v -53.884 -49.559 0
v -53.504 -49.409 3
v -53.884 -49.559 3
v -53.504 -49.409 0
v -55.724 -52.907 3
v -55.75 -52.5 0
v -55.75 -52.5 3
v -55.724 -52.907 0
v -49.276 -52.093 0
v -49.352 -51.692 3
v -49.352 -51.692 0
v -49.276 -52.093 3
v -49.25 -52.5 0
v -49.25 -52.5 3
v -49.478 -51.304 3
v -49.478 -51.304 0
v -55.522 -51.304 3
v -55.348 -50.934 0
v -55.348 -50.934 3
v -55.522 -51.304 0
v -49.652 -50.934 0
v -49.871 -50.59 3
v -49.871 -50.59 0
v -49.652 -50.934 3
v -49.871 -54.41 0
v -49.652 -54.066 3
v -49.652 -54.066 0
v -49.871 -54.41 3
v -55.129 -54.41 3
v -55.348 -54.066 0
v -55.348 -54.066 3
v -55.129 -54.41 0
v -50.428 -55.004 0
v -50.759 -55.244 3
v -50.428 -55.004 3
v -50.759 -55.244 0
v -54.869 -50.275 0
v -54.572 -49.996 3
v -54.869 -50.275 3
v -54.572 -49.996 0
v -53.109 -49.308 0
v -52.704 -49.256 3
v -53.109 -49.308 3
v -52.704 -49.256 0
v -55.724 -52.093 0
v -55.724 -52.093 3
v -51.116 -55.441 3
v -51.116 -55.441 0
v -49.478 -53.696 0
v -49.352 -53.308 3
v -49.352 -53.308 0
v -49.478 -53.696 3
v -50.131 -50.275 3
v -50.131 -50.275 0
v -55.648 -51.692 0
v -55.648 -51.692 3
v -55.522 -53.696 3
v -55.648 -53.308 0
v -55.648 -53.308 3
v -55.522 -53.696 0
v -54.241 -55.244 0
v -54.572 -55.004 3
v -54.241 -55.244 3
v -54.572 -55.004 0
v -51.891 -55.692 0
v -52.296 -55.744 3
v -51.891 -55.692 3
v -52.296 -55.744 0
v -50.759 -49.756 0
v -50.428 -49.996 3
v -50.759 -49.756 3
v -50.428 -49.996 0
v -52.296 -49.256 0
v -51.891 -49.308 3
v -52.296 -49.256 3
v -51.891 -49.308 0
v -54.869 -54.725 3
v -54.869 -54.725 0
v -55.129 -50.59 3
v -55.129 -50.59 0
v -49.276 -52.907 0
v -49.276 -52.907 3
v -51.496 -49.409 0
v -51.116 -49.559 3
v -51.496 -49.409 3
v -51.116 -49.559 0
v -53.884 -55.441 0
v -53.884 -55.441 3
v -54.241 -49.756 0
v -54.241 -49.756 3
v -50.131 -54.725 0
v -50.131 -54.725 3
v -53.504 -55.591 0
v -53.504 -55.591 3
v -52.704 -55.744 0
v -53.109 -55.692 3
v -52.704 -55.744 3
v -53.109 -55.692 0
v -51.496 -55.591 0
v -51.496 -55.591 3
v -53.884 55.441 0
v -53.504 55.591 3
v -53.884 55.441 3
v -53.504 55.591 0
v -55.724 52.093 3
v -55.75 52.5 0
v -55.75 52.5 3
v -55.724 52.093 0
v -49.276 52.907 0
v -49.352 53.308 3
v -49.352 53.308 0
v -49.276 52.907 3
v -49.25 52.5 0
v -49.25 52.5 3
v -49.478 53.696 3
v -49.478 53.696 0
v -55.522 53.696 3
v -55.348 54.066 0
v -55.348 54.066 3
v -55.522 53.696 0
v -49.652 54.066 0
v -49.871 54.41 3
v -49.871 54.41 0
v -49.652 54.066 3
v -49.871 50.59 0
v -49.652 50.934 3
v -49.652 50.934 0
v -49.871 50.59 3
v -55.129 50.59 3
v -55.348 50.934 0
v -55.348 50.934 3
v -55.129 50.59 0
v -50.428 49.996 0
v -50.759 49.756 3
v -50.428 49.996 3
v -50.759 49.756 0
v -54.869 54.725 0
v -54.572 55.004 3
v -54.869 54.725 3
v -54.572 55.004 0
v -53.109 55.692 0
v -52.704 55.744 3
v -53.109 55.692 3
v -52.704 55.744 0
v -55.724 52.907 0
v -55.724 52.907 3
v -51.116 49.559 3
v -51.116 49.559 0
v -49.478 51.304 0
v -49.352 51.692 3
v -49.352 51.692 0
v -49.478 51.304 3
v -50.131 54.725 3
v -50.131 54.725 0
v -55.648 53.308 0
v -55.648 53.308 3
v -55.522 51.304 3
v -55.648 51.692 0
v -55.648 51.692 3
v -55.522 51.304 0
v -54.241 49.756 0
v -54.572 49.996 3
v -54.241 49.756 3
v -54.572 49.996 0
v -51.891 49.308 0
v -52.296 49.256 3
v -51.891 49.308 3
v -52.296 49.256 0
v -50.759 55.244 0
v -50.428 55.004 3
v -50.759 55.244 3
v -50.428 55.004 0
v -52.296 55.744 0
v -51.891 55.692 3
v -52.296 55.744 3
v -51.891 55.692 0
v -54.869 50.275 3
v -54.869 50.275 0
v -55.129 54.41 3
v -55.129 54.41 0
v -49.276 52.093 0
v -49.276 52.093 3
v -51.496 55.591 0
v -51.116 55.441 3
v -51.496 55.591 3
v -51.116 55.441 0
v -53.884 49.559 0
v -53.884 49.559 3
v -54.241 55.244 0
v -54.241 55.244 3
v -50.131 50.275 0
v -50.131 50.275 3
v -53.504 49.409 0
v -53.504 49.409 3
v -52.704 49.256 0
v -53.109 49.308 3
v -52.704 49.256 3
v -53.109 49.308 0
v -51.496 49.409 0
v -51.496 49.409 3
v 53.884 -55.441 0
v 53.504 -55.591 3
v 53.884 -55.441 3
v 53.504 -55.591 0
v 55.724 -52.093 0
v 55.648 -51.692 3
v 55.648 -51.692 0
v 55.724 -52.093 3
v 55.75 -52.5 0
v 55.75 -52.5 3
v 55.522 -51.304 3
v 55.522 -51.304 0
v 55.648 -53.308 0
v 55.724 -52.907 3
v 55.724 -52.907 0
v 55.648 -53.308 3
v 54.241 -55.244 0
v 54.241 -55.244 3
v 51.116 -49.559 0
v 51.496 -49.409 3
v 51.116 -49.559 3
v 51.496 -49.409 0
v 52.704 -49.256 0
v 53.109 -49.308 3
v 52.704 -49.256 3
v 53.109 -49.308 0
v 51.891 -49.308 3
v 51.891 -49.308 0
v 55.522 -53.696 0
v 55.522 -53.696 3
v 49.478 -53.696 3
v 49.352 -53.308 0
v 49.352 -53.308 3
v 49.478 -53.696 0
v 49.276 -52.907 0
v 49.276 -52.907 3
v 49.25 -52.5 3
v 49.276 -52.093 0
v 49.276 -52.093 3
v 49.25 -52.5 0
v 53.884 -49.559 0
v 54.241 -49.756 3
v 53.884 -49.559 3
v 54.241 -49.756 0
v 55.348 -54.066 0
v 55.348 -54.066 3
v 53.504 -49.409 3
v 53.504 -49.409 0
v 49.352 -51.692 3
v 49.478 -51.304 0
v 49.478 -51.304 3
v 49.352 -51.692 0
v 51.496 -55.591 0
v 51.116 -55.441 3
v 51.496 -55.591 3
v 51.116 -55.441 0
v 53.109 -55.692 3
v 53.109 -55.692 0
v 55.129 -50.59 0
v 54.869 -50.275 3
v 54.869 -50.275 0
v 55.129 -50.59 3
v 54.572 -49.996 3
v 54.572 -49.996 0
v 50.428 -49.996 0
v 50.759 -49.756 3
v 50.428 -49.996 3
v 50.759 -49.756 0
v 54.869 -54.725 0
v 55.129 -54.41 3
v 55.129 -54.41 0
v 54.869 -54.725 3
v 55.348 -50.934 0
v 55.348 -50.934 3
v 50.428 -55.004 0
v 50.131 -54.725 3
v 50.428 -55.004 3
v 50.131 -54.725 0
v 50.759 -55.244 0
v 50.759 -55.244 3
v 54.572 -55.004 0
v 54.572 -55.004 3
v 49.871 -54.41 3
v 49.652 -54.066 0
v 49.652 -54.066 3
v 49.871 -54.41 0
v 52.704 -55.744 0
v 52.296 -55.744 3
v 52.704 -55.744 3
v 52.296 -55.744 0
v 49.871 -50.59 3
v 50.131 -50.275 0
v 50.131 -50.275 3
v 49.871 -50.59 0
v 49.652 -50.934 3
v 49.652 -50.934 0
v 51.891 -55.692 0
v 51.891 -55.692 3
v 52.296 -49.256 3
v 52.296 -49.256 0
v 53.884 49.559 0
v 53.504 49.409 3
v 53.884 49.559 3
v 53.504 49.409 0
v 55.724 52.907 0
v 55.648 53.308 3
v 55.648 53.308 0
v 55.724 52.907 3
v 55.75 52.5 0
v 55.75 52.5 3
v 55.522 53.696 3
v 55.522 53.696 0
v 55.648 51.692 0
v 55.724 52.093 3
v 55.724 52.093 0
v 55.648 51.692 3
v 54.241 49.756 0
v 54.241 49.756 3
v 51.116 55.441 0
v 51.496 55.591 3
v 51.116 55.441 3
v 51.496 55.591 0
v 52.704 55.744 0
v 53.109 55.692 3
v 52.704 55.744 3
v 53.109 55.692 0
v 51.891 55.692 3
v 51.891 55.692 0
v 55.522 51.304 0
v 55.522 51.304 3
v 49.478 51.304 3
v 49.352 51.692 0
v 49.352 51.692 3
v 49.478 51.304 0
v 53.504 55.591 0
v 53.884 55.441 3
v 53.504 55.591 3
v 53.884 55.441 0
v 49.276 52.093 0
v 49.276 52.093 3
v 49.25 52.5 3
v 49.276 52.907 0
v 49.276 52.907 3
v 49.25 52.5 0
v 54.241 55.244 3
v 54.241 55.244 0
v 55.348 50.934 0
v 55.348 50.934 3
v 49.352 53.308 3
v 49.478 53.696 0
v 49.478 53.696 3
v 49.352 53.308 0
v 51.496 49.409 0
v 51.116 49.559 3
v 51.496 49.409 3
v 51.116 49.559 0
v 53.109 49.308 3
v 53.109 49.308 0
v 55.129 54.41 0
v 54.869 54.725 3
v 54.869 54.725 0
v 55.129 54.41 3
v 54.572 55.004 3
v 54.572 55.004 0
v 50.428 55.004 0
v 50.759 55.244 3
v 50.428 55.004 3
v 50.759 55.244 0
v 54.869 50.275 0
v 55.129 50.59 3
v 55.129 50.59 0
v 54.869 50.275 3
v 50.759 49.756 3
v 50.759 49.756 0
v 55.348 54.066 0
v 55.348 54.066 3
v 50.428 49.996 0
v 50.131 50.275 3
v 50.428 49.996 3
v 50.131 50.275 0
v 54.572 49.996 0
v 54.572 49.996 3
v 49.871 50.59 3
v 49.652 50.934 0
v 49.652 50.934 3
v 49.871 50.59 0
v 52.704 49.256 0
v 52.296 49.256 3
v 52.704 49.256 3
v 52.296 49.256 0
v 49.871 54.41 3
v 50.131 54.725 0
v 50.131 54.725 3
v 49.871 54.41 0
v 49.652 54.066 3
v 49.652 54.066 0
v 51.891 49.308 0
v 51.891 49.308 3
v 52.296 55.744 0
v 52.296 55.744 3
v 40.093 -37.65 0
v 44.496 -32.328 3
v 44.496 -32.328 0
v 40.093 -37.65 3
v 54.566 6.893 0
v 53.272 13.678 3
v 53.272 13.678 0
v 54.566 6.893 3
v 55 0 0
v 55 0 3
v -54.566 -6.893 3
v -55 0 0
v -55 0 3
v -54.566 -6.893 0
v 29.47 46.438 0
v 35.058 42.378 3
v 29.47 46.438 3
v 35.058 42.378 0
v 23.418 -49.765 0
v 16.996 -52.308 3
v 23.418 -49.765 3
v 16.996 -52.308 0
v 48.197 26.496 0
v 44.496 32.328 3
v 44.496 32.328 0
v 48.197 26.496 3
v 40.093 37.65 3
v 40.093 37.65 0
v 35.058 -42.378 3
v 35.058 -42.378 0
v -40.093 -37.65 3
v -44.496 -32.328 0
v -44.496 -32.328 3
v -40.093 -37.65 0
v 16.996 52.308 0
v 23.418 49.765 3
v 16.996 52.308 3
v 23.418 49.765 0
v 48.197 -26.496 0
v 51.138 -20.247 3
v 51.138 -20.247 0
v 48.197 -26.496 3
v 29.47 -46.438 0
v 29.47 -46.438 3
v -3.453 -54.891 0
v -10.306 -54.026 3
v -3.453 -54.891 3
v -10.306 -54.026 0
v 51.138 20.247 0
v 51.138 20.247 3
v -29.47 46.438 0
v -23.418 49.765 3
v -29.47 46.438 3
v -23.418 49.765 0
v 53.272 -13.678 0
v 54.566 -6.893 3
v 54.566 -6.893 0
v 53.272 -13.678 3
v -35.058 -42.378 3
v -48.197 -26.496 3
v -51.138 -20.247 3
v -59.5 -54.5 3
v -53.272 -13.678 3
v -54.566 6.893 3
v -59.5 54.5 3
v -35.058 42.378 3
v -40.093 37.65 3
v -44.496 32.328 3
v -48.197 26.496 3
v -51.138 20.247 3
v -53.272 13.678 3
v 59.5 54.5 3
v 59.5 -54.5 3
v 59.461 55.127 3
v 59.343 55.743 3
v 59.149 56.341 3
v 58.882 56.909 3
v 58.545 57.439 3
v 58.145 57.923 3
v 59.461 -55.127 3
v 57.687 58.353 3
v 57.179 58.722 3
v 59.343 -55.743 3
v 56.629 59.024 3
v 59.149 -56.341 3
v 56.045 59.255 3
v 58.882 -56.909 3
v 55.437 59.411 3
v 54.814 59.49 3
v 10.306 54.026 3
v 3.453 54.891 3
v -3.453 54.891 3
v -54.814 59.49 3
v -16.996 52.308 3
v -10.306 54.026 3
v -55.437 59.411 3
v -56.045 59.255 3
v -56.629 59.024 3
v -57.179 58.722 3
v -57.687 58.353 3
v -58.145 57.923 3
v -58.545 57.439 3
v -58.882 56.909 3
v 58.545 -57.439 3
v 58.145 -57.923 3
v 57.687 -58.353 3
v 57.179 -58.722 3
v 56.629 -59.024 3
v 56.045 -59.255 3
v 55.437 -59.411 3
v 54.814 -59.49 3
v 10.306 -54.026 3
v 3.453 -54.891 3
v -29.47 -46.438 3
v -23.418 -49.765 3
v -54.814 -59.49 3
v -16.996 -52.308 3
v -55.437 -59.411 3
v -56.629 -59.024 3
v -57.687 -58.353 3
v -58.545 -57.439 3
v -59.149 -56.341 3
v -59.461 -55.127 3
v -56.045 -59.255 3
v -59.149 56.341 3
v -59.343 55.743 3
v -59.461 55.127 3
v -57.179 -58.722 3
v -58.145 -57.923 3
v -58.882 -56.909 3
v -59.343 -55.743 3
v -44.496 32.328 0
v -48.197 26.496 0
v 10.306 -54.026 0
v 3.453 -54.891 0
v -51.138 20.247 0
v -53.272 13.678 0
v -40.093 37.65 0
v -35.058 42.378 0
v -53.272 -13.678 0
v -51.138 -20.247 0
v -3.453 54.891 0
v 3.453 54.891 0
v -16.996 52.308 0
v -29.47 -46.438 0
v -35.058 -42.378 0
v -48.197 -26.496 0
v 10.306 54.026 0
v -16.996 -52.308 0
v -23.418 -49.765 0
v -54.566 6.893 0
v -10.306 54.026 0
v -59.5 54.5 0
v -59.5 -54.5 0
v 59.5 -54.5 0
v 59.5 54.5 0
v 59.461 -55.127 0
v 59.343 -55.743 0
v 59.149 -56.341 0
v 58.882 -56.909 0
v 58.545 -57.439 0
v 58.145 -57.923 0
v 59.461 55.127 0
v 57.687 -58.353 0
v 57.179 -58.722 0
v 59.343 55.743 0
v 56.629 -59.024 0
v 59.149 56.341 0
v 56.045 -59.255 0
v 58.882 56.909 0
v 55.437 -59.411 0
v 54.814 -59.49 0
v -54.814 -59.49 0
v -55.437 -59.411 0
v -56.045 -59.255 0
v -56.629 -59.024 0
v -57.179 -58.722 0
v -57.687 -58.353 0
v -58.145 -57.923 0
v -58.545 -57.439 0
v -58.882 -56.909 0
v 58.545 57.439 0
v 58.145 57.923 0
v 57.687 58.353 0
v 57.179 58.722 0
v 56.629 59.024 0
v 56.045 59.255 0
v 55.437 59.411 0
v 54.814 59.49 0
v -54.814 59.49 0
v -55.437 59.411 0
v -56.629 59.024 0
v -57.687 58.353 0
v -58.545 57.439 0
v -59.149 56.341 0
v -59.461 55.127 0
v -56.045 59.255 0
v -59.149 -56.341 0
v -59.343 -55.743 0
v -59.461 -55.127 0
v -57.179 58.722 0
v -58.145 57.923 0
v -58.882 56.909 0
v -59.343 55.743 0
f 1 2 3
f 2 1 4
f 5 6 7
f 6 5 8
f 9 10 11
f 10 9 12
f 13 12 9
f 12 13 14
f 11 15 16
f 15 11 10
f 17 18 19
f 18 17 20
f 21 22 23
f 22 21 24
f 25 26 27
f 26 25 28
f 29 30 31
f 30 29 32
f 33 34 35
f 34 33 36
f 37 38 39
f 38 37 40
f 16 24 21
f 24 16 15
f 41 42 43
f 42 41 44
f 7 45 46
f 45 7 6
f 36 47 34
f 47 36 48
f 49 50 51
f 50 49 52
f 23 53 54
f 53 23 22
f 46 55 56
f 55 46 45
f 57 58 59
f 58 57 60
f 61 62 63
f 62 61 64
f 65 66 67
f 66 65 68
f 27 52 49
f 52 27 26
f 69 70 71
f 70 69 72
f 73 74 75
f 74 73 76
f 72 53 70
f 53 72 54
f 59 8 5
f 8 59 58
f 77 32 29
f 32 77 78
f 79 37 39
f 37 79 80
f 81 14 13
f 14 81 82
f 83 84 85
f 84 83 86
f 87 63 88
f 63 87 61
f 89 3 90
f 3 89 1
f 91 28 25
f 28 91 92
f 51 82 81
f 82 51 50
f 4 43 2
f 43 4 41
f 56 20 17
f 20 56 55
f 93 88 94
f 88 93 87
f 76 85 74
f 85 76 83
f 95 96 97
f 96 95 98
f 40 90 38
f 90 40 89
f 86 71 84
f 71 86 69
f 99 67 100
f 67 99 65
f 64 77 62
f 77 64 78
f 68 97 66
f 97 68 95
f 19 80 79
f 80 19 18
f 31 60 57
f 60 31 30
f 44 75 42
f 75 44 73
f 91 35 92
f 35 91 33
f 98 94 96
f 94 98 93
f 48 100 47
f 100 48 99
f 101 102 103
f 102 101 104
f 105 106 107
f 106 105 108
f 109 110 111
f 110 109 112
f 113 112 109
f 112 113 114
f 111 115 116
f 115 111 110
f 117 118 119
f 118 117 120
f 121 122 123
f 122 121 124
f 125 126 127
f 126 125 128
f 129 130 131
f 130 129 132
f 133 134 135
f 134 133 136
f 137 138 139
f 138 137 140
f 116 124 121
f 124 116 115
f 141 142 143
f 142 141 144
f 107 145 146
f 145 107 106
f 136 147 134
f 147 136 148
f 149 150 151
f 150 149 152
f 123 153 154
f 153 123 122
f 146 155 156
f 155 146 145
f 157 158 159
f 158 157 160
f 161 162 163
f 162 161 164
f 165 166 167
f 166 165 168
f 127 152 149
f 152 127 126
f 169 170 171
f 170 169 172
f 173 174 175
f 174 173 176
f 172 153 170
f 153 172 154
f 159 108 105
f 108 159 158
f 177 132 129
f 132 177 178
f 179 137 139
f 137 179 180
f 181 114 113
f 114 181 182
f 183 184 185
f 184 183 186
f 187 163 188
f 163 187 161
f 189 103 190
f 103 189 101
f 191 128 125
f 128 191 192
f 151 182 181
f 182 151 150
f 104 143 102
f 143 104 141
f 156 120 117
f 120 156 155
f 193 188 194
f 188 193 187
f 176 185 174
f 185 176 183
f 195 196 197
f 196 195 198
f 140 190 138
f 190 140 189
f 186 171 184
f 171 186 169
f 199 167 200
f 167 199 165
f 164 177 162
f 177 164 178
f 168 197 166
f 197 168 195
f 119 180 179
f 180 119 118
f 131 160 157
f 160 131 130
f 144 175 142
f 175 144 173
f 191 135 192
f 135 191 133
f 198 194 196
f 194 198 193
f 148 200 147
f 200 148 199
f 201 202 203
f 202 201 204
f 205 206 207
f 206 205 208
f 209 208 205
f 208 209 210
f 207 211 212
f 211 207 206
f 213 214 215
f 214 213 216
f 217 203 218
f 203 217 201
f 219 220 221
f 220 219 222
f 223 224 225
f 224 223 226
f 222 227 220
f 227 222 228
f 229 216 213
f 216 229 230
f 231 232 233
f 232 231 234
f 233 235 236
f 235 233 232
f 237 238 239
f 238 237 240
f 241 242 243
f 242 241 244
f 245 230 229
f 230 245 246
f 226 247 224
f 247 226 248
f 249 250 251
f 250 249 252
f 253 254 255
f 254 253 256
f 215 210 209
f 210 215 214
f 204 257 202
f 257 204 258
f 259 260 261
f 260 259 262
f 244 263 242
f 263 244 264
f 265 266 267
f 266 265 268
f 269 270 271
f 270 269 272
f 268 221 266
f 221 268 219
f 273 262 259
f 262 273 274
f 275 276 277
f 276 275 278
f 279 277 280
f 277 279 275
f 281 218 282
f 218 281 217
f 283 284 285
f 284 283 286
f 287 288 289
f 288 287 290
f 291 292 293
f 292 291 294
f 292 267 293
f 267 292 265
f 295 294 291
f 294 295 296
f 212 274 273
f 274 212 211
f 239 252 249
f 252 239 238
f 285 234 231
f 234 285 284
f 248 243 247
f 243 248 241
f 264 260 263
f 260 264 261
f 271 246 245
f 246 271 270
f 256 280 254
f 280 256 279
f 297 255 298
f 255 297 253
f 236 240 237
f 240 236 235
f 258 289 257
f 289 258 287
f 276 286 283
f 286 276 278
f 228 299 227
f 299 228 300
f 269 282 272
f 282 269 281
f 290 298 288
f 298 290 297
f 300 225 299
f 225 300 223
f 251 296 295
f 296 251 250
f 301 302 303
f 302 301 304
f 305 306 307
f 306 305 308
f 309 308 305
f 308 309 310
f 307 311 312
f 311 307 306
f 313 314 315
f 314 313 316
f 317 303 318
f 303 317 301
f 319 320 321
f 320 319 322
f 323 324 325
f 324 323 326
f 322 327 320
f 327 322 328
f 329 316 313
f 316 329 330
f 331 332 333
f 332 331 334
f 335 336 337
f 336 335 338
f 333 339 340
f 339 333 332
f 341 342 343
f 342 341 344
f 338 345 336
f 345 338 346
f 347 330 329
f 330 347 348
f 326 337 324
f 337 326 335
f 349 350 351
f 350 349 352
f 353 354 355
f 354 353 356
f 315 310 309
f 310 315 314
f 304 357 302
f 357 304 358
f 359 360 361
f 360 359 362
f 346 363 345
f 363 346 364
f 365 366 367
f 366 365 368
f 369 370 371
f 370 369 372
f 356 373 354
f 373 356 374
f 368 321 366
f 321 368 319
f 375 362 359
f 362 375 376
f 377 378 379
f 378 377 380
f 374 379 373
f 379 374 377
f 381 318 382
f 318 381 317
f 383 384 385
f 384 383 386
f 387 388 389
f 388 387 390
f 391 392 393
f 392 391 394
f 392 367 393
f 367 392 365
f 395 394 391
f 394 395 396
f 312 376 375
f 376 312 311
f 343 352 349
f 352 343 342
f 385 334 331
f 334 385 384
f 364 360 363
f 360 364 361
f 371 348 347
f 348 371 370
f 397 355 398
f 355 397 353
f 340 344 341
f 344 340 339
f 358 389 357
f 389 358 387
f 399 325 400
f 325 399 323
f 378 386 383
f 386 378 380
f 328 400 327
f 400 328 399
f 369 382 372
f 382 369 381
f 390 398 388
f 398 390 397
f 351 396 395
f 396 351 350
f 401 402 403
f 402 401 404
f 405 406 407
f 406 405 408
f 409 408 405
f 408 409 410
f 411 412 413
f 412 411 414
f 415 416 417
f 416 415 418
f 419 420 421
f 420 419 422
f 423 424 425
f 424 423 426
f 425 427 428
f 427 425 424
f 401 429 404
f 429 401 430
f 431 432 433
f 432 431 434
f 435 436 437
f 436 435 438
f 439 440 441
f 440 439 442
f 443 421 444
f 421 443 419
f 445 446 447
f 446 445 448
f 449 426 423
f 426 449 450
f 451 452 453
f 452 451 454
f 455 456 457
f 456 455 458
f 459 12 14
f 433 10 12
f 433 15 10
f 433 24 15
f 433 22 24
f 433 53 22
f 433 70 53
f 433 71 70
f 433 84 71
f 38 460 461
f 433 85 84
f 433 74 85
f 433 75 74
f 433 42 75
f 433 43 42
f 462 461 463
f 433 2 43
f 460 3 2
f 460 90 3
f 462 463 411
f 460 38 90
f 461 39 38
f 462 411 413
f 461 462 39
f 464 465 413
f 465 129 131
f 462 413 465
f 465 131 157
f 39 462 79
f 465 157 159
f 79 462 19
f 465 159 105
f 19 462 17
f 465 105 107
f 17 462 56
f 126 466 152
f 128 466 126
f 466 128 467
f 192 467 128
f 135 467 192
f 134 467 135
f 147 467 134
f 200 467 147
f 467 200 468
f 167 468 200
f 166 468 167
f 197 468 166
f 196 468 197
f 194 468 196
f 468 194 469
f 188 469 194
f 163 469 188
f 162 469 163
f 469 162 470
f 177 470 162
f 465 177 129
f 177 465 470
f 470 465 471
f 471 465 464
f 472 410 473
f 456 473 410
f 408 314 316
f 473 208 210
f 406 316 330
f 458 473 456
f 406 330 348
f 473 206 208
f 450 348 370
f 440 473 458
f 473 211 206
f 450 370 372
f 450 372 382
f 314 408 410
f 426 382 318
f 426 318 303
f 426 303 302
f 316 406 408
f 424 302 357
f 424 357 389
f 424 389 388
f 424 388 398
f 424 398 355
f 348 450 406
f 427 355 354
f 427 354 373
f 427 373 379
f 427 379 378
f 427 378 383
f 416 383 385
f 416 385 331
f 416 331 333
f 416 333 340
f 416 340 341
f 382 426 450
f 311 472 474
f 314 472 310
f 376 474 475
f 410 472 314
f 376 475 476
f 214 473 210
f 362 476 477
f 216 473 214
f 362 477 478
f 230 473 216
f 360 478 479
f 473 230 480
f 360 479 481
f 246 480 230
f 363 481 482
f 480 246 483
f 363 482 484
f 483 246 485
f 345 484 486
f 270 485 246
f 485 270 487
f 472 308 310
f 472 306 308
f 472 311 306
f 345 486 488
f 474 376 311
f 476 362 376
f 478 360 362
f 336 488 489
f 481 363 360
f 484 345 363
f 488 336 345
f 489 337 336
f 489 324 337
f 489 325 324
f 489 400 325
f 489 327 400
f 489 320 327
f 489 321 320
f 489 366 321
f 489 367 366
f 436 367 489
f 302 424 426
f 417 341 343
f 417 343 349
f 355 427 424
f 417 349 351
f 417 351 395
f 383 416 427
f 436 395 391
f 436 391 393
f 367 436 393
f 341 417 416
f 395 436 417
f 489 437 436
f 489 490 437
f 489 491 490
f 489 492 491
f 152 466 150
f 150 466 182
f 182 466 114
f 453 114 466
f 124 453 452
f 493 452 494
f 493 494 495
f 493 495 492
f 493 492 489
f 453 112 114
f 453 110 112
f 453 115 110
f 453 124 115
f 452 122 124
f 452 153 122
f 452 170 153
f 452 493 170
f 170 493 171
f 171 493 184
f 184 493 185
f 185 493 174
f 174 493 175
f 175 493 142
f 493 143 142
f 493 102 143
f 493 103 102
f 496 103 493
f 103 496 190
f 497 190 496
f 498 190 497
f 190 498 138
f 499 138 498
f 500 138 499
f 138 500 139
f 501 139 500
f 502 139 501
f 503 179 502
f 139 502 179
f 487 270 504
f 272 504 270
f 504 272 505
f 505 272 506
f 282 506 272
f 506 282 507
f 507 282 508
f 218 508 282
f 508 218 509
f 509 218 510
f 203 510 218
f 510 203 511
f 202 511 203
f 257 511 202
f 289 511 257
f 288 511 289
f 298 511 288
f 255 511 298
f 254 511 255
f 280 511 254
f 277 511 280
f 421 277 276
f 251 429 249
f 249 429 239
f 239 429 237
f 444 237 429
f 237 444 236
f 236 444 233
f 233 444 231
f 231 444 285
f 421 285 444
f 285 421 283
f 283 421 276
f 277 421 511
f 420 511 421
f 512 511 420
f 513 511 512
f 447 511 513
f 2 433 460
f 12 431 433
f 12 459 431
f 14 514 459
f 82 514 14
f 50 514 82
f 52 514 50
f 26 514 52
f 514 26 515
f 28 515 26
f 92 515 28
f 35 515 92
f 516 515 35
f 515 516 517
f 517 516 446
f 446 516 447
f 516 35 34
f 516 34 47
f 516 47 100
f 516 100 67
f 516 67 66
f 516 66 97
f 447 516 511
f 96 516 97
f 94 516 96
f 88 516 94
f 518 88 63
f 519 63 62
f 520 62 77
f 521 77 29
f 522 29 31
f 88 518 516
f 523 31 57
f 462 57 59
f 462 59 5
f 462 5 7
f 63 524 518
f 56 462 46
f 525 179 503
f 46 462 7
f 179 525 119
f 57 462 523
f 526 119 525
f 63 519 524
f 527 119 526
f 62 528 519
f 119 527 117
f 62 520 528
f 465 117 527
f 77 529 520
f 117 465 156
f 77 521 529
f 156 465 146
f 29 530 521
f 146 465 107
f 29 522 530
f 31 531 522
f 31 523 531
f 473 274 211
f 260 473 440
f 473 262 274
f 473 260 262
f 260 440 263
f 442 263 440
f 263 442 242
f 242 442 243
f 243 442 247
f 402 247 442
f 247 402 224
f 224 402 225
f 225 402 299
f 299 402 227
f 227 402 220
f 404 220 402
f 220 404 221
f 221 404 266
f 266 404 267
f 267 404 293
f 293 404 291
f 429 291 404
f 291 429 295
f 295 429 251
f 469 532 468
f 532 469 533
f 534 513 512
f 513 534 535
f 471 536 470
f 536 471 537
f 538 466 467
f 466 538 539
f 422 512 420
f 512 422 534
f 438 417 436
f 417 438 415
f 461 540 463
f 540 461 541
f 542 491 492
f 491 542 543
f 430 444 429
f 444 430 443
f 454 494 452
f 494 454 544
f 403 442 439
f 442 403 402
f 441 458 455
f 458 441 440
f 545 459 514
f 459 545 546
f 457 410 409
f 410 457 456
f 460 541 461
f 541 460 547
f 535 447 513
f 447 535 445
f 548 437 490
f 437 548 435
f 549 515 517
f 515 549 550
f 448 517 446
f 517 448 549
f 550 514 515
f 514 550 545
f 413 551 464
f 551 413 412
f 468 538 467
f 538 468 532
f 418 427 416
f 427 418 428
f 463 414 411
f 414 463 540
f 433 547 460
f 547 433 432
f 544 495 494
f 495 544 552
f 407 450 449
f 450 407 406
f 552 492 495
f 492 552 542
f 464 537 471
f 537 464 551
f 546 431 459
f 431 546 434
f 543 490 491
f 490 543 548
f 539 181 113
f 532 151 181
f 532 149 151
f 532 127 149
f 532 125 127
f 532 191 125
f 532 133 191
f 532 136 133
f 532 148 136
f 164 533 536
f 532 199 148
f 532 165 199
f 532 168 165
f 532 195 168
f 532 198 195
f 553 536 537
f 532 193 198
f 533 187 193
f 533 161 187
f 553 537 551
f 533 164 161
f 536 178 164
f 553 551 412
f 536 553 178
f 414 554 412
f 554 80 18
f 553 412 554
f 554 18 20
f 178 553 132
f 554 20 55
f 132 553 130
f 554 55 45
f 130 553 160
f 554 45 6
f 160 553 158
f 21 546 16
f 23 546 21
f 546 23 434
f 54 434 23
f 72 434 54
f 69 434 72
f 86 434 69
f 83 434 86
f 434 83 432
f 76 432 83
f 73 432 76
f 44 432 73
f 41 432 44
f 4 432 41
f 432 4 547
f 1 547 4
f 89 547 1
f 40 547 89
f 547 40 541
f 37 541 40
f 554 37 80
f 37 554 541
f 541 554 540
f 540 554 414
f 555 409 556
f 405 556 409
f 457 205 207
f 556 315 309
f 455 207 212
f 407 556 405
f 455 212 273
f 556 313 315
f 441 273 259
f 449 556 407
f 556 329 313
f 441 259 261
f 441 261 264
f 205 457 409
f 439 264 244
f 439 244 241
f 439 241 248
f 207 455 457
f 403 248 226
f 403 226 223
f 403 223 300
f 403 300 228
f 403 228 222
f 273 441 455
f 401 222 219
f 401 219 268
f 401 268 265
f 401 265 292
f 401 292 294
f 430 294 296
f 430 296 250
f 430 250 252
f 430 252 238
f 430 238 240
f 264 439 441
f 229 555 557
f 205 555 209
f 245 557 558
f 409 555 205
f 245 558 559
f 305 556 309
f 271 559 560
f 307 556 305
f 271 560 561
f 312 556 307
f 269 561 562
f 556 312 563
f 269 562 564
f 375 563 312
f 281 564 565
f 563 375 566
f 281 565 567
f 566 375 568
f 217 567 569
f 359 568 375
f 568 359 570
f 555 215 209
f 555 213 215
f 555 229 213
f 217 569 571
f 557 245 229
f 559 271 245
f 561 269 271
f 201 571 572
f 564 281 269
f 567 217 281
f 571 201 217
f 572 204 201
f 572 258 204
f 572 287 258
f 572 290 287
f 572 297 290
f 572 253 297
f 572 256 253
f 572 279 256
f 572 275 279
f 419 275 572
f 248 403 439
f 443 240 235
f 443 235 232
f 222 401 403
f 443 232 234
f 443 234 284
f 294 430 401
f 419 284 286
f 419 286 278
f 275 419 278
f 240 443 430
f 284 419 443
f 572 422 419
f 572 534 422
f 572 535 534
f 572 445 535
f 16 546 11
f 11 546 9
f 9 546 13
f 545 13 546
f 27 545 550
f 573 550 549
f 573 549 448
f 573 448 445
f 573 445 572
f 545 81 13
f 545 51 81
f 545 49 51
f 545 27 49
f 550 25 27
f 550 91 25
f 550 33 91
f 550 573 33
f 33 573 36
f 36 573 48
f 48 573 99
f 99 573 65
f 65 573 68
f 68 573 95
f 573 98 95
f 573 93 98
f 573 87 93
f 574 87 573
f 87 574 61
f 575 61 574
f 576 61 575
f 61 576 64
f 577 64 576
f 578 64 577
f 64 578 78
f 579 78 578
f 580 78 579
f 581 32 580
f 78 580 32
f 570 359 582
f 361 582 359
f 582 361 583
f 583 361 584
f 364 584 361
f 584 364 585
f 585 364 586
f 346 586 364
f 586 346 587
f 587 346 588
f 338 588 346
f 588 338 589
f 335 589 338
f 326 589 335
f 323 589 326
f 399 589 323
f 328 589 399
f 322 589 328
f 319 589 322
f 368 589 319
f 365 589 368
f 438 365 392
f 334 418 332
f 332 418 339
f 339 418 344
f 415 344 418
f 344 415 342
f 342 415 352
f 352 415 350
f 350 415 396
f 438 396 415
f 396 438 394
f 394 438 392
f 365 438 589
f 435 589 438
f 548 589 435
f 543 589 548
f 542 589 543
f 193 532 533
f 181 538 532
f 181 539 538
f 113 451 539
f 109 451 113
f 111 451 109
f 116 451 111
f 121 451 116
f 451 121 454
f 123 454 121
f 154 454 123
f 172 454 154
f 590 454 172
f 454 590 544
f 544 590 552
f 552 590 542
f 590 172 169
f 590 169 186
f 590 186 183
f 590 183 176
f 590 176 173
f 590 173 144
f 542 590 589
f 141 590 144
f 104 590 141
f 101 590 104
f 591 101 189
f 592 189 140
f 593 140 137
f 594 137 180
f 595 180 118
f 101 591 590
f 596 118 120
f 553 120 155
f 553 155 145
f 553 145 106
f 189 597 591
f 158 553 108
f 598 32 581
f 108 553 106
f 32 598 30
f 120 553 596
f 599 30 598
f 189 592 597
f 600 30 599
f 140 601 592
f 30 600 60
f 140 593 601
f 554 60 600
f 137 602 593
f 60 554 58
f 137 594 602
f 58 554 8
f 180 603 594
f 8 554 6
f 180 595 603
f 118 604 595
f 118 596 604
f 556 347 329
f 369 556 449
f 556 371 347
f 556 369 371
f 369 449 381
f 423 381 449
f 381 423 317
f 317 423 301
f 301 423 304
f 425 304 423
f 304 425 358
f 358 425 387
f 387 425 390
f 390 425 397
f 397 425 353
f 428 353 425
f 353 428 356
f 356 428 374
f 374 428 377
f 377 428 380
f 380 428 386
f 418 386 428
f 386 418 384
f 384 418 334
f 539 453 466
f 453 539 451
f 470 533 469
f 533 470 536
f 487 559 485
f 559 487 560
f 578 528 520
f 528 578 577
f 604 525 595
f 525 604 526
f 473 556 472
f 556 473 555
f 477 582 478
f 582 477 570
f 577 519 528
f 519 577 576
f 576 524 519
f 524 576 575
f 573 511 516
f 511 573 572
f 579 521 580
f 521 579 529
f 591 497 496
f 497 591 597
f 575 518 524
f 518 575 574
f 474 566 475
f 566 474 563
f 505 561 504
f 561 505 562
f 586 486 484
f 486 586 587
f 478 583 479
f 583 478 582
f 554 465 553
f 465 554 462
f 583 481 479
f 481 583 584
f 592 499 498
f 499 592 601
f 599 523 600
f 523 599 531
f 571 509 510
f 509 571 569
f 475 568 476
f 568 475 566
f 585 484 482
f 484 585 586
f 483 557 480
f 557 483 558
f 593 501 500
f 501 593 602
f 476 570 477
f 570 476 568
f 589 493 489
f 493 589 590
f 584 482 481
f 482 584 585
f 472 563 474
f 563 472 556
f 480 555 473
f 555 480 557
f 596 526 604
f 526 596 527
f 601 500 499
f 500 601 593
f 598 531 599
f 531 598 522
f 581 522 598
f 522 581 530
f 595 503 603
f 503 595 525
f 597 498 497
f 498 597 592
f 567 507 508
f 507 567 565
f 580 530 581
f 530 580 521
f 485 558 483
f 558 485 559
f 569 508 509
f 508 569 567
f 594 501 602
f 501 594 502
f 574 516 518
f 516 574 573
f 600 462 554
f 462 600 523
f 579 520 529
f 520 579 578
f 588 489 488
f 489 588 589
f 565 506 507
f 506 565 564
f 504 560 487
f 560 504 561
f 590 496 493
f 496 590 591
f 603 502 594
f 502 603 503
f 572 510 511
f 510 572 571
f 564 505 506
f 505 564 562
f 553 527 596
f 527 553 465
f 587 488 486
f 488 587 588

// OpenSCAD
$fn = 50;

difference() {
	union() {
		hull() {
			translate(v = [-54.5, 54.5, 0]) {
				cylinder(h = 3, r = 5);
			}
			translate(v = [54.5, 54.5, 0]) {
				cylinder(h = 3, r = 5);
			}
			translate(v = [-54.5, -54.5, 0]) {
				cylinder(h = 3, r = 5);
			}
			translate(v = [54.5, -54.5, 0]) {
				cylinder(h = 3, r = 5);
			}
		}
	}
	union() {
		translate(v = [-52.5, -52.5, -100.0]) {
			cylinder(h = 200, r = 3.25);
		}
		translate(v = [-52.5, 52.5, -100.0]) {
			cylinder(h = 200, r = 3.25);
		}
		translate(v = [52.5, -52.5, -100.0]) {
			cylinder(h = 200, r = 3.25);
		}
		translate(v = [52.5, 52.5, -100.0]) {
			cylinder(h = 200, r = 3.25);
		}
		translate(v = [-52.5, -52.5, -100.0]) {
			cylinder(h = 200, r = 1.8);
		}
		translate(v = [-52.5, 52.5, -100.0]) {
			cylinder(h = 200, r = 1.8);
		}
		translate(v = [52.5, -52.5, -100.0]) {
			cylinder(h = 200, r = 1.8);
		}
		translate(v = [52.5, 52.5, -100.0]) {
			cylinder(h = 200, r = 1.8);
		}
		cylinder(h = 3, r = 55.0);
	}
}
